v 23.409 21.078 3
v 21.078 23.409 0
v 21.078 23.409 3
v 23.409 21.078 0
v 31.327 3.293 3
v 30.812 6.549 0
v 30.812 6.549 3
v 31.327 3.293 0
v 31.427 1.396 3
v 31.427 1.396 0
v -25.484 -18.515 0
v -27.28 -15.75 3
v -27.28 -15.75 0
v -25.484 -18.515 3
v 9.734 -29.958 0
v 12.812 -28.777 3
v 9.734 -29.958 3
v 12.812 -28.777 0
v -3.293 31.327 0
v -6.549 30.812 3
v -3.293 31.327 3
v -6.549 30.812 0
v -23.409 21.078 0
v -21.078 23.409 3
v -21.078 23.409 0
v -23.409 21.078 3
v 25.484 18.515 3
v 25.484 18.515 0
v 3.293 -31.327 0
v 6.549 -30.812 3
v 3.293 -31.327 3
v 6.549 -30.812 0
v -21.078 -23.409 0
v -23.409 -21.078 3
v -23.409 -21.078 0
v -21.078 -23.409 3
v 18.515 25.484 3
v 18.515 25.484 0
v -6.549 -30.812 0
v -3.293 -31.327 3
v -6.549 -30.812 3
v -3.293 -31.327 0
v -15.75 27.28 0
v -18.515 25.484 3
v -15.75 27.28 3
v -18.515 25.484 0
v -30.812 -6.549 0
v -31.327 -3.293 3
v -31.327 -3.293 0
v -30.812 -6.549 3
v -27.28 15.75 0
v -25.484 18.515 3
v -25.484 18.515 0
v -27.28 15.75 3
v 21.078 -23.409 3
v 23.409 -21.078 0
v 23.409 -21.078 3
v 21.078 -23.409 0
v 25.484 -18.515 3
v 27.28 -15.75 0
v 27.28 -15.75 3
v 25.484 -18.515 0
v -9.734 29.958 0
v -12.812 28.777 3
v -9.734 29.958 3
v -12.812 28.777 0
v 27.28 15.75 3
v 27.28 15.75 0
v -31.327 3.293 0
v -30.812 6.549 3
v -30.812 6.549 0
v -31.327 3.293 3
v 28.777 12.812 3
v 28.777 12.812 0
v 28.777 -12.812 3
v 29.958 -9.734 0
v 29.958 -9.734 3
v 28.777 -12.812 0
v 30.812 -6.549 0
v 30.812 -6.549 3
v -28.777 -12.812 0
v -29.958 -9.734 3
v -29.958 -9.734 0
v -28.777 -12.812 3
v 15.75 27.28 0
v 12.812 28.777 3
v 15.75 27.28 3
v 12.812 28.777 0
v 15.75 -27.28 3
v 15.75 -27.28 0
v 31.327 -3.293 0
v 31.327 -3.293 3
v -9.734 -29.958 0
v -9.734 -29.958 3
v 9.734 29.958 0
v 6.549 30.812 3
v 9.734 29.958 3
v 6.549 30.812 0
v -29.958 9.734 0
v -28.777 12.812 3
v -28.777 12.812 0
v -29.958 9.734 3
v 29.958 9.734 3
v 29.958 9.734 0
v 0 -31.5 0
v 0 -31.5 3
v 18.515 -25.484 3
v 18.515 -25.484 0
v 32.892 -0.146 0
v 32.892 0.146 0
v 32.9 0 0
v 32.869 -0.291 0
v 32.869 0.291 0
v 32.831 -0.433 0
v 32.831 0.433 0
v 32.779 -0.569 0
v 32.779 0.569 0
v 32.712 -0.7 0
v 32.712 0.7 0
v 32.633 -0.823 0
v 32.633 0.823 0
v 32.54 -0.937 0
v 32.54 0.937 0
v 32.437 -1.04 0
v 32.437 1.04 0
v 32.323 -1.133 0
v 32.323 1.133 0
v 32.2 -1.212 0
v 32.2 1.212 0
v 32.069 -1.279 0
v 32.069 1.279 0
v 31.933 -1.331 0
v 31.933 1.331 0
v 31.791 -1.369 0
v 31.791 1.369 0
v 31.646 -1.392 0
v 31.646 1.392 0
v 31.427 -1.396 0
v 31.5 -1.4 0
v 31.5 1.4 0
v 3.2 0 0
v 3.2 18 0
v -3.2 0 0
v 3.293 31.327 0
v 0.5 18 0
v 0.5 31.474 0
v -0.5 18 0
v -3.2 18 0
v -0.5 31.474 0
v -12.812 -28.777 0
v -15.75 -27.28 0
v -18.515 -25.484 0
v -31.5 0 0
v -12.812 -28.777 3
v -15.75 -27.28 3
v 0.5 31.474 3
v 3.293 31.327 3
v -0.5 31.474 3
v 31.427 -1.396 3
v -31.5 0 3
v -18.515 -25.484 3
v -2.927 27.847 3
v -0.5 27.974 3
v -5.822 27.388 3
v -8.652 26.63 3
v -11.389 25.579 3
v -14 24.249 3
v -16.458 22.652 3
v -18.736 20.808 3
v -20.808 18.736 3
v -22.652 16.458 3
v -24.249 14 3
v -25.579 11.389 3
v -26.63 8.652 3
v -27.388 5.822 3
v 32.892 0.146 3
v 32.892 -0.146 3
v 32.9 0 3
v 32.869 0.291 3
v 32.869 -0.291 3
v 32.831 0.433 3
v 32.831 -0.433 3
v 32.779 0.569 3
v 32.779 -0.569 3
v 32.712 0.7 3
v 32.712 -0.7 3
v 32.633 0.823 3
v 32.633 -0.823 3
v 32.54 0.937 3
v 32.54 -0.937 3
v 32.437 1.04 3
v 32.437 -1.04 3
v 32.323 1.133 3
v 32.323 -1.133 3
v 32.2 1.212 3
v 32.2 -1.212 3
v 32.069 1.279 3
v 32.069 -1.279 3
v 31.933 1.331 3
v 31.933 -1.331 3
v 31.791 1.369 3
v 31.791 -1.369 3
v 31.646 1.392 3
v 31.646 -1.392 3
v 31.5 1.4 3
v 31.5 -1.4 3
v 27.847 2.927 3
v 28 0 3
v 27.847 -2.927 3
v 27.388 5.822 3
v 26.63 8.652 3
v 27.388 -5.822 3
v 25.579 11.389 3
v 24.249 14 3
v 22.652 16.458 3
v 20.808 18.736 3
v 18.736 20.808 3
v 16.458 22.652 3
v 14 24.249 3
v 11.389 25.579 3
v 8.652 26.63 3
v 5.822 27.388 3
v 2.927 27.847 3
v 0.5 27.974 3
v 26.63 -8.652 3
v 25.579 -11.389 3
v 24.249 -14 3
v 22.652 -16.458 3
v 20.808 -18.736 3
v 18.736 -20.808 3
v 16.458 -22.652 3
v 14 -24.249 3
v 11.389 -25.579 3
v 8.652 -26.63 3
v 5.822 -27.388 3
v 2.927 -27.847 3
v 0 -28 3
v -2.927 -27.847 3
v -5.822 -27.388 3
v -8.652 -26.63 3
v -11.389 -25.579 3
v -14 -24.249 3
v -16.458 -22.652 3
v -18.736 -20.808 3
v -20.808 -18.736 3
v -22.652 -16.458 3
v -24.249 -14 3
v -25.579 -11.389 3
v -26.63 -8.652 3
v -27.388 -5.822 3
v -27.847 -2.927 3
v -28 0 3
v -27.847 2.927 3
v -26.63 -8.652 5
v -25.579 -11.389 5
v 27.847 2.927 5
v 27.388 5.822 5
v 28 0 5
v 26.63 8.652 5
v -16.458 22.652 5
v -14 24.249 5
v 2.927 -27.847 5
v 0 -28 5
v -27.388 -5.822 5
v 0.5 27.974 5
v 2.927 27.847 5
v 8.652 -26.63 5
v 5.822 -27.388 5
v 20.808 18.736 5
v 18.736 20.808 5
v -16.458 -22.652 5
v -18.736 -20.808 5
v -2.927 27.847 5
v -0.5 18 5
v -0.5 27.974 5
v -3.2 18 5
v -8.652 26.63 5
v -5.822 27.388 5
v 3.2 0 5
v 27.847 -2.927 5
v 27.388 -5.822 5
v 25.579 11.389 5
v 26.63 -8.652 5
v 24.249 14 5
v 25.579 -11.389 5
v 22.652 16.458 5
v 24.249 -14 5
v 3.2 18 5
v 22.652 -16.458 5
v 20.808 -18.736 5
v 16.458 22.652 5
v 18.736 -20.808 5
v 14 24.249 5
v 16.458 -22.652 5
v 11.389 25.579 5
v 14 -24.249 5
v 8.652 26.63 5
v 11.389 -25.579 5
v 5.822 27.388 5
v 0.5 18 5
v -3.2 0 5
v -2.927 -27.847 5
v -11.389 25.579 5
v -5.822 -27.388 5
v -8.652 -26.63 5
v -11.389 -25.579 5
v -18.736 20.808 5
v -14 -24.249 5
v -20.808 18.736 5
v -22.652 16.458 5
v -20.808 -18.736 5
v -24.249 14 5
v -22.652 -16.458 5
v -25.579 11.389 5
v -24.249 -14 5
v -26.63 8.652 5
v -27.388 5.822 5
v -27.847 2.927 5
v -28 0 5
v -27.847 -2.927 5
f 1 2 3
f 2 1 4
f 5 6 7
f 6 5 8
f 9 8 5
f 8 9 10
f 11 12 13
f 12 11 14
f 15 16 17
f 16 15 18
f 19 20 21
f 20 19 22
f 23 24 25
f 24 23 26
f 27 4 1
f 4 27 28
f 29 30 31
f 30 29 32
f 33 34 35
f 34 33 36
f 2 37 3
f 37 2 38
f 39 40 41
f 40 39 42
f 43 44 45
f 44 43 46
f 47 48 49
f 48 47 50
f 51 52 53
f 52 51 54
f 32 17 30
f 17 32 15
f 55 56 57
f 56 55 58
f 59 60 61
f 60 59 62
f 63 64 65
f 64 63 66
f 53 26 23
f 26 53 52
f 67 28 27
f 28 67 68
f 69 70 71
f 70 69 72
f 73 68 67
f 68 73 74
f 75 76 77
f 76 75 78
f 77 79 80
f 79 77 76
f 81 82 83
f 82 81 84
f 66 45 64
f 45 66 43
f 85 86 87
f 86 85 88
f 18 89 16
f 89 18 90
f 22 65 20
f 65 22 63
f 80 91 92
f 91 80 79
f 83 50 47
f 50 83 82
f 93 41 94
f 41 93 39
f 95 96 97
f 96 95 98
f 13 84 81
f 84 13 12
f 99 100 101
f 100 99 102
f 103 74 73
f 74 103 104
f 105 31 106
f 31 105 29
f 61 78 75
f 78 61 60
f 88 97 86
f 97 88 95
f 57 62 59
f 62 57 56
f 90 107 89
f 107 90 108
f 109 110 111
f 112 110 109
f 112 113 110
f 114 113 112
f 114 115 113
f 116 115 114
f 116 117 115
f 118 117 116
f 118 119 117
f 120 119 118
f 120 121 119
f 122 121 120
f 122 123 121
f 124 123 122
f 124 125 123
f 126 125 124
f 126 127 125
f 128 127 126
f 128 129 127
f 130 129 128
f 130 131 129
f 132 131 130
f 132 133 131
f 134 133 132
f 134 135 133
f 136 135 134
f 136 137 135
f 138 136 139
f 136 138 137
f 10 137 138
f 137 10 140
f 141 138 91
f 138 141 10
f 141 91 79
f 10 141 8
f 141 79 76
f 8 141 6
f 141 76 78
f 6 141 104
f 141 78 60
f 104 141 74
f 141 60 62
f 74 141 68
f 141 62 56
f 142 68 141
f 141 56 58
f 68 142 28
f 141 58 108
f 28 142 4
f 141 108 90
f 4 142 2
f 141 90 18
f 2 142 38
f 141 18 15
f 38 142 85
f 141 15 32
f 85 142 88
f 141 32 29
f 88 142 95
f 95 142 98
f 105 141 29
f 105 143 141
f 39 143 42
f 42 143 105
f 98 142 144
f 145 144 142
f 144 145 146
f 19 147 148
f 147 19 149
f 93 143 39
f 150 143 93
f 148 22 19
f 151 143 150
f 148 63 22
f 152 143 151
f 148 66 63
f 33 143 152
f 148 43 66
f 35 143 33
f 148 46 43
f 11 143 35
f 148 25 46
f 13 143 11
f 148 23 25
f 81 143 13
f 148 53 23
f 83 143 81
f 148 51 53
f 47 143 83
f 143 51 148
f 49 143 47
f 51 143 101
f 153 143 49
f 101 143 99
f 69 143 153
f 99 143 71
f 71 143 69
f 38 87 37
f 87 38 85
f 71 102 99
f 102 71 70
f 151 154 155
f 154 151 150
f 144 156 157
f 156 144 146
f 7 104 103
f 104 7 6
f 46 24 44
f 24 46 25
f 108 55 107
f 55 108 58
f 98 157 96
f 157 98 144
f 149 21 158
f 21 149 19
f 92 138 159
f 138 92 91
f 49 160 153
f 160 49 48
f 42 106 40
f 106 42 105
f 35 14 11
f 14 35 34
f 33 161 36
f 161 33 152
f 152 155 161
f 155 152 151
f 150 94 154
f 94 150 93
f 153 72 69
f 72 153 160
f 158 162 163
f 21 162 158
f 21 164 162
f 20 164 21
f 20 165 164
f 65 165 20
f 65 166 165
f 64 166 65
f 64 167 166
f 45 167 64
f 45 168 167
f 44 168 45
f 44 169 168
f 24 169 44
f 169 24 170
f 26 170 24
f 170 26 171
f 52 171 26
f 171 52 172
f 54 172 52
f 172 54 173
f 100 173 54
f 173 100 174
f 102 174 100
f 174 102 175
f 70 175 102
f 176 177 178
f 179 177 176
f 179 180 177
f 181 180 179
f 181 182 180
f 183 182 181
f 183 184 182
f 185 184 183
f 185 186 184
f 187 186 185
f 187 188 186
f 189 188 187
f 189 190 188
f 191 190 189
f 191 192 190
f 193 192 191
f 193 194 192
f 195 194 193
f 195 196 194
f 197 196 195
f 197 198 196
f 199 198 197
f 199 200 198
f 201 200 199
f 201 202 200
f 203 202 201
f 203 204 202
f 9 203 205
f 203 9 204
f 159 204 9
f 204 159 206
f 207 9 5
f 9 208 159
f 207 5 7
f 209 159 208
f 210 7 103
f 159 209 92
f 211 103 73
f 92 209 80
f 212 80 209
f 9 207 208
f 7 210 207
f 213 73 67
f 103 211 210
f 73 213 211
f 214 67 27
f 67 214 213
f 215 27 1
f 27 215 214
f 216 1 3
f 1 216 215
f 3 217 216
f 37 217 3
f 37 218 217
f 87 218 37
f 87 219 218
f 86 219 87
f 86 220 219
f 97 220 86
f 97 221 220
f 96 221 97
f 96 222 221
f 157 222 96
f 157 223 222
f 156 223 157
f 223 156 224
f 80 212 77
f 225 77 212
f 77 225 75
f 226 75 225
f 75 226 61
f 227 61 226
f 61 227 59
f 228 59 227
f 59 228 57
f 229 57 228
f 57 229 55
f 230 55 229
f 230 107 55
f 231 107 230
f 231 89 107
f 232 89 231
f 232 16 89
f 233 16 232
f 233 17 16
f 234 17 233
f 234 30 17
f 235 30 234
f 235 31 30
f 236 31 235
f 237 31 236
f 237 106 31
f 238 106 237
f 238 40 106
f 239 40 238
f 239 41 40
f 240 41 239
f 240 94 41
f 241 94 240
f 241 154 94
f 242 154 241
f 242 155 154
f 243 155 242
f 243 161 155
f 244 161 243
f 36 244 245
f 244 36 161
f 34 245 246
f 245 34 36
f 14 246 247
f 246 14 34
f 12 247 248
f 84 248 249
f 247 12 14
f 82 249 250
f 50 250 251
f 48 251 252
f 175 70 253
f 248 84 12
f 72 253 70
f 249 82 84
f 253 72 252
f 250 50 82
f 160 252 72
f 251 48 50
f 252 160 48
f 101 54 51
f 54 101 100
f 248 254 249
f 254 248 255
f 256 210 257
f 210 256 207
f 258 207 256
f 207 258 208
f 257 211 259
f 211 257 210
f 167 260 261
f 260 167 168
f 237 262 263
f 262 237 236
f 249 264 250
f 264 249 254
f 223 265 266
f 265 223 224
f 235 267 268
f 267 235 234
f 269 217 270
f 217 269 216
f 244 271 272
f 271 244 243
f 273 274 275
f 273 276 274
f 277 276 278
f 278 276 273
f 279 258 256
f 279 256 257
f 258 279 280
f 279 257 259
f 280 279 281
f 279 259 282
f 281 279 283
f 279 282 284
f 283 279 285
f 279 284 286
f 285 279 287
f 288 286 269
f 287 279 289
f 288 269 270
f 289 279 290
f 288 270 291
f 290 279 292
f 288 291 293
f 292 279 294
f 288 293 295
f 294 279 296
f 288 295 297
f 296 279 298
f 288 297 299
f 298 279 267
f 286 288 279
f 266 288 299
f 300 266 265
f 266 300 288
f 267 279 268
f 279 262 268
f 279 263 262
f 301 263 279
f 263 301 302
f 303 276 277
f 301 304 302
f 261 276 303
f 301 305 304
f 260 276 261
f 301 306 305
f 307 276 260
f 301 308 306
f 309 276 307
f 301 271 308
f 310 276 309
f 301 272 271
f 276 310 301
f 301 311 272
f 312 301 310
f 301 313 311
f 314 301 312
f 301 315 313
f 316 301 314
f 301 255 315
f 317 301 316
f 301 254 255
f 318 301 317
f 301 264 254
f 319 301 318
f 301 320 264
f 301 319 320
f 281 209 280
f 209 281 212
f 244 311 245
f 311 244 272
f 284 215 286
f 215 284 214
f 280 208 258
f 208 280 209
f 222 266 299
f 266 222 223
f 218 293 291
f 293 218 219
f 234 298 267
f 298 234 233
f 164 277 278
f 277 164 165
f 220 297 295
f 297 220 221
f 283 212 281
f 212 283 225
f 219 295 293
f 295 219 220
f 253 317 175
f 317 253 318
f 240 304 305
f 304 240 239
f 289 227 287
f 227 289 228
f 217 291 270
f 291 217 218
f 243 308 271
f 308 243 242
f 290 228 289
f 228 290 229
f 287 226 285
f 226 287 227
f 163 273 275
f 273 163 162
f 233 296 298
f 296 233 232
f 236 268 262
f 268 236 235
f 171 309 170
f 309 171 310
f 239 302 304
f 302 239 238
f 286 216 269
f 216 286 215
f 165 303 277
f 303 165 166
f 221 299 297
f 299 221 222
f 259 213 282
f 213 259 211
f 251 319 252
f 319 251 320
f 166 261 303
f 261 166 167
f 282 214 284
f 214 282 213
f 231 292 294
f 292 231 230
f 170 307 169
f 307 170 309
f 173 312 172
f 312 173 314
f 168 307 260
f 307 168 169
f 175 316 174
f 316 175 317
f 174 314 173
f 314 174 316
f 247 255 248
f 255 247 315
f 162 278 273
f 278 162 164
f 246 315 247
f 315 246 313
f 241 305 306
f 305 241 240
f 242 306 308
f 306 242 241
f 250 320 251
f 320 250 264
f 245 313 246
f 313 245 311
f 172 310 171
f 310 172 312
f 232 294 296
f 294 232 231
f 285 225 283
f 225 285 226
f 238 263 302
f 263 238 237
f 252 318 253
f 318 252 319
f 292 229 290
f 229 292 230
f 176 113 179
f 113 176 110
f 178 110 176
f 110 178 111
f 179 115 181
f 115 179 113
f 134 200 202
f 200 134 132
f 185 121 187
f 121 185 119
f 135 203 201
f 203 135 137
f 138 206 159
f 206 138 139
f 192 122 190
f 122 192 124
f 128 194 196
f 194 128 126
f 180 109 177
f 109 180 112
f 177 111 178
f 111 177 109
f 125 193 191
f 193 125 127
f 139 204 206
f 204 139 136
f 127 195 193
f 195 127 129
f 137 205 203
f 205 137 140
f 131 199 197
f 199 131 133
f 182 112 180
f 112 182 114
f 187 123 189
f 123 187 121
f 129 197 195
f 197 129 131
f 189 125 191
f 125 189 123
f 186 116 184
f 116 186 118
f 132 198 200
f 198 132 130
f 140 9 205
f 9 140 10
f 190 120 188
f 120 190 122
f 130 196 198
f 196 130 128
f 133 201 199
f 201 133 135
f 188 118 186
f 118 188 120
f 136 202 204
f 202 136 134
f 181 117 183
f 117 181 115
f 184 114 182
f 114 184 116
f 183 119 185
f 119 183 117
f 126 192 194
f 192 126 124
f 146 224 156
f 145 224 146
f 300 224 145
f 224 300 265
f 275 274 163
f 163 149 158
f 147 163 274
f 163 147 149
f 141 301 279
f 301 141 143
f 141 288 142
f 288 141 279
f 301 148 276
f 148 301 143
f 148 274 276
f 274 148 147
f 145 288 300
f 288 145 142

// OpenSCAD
thick=3; //thickness of plate to table
topdia=63; //diameter of plate

edge=2; //thickness of bottom edge
botdia=56; //diameter of the bottom edge

key=2.8; //diameter of bump for key

blade=1; //width of the blade metal

cutx=6.4; //width of cutaway for turning of blade
cuty=18; //depth of cutaway
offset=0; //offset direction of cutaway for blade
res=60;

difference(){
difference(){
union(){
cylinder(thick, d=topdia, $fn=res);
translate([0,0,thick]) cylinder(edge, d=botdia, $fn=res);
translate([(topdia/2),0,0]) cylinder(thick, d=key, $fn=res);
}
translate ([0,topdia/4, (thick+edge)/2]) cube(size=[blade, topdia/2, thick+edge], center=true);
}
translate ([-cutx/2,-offset/2,0]) cube(size=[cutx,cuty,thick+edge], center=false);
}
